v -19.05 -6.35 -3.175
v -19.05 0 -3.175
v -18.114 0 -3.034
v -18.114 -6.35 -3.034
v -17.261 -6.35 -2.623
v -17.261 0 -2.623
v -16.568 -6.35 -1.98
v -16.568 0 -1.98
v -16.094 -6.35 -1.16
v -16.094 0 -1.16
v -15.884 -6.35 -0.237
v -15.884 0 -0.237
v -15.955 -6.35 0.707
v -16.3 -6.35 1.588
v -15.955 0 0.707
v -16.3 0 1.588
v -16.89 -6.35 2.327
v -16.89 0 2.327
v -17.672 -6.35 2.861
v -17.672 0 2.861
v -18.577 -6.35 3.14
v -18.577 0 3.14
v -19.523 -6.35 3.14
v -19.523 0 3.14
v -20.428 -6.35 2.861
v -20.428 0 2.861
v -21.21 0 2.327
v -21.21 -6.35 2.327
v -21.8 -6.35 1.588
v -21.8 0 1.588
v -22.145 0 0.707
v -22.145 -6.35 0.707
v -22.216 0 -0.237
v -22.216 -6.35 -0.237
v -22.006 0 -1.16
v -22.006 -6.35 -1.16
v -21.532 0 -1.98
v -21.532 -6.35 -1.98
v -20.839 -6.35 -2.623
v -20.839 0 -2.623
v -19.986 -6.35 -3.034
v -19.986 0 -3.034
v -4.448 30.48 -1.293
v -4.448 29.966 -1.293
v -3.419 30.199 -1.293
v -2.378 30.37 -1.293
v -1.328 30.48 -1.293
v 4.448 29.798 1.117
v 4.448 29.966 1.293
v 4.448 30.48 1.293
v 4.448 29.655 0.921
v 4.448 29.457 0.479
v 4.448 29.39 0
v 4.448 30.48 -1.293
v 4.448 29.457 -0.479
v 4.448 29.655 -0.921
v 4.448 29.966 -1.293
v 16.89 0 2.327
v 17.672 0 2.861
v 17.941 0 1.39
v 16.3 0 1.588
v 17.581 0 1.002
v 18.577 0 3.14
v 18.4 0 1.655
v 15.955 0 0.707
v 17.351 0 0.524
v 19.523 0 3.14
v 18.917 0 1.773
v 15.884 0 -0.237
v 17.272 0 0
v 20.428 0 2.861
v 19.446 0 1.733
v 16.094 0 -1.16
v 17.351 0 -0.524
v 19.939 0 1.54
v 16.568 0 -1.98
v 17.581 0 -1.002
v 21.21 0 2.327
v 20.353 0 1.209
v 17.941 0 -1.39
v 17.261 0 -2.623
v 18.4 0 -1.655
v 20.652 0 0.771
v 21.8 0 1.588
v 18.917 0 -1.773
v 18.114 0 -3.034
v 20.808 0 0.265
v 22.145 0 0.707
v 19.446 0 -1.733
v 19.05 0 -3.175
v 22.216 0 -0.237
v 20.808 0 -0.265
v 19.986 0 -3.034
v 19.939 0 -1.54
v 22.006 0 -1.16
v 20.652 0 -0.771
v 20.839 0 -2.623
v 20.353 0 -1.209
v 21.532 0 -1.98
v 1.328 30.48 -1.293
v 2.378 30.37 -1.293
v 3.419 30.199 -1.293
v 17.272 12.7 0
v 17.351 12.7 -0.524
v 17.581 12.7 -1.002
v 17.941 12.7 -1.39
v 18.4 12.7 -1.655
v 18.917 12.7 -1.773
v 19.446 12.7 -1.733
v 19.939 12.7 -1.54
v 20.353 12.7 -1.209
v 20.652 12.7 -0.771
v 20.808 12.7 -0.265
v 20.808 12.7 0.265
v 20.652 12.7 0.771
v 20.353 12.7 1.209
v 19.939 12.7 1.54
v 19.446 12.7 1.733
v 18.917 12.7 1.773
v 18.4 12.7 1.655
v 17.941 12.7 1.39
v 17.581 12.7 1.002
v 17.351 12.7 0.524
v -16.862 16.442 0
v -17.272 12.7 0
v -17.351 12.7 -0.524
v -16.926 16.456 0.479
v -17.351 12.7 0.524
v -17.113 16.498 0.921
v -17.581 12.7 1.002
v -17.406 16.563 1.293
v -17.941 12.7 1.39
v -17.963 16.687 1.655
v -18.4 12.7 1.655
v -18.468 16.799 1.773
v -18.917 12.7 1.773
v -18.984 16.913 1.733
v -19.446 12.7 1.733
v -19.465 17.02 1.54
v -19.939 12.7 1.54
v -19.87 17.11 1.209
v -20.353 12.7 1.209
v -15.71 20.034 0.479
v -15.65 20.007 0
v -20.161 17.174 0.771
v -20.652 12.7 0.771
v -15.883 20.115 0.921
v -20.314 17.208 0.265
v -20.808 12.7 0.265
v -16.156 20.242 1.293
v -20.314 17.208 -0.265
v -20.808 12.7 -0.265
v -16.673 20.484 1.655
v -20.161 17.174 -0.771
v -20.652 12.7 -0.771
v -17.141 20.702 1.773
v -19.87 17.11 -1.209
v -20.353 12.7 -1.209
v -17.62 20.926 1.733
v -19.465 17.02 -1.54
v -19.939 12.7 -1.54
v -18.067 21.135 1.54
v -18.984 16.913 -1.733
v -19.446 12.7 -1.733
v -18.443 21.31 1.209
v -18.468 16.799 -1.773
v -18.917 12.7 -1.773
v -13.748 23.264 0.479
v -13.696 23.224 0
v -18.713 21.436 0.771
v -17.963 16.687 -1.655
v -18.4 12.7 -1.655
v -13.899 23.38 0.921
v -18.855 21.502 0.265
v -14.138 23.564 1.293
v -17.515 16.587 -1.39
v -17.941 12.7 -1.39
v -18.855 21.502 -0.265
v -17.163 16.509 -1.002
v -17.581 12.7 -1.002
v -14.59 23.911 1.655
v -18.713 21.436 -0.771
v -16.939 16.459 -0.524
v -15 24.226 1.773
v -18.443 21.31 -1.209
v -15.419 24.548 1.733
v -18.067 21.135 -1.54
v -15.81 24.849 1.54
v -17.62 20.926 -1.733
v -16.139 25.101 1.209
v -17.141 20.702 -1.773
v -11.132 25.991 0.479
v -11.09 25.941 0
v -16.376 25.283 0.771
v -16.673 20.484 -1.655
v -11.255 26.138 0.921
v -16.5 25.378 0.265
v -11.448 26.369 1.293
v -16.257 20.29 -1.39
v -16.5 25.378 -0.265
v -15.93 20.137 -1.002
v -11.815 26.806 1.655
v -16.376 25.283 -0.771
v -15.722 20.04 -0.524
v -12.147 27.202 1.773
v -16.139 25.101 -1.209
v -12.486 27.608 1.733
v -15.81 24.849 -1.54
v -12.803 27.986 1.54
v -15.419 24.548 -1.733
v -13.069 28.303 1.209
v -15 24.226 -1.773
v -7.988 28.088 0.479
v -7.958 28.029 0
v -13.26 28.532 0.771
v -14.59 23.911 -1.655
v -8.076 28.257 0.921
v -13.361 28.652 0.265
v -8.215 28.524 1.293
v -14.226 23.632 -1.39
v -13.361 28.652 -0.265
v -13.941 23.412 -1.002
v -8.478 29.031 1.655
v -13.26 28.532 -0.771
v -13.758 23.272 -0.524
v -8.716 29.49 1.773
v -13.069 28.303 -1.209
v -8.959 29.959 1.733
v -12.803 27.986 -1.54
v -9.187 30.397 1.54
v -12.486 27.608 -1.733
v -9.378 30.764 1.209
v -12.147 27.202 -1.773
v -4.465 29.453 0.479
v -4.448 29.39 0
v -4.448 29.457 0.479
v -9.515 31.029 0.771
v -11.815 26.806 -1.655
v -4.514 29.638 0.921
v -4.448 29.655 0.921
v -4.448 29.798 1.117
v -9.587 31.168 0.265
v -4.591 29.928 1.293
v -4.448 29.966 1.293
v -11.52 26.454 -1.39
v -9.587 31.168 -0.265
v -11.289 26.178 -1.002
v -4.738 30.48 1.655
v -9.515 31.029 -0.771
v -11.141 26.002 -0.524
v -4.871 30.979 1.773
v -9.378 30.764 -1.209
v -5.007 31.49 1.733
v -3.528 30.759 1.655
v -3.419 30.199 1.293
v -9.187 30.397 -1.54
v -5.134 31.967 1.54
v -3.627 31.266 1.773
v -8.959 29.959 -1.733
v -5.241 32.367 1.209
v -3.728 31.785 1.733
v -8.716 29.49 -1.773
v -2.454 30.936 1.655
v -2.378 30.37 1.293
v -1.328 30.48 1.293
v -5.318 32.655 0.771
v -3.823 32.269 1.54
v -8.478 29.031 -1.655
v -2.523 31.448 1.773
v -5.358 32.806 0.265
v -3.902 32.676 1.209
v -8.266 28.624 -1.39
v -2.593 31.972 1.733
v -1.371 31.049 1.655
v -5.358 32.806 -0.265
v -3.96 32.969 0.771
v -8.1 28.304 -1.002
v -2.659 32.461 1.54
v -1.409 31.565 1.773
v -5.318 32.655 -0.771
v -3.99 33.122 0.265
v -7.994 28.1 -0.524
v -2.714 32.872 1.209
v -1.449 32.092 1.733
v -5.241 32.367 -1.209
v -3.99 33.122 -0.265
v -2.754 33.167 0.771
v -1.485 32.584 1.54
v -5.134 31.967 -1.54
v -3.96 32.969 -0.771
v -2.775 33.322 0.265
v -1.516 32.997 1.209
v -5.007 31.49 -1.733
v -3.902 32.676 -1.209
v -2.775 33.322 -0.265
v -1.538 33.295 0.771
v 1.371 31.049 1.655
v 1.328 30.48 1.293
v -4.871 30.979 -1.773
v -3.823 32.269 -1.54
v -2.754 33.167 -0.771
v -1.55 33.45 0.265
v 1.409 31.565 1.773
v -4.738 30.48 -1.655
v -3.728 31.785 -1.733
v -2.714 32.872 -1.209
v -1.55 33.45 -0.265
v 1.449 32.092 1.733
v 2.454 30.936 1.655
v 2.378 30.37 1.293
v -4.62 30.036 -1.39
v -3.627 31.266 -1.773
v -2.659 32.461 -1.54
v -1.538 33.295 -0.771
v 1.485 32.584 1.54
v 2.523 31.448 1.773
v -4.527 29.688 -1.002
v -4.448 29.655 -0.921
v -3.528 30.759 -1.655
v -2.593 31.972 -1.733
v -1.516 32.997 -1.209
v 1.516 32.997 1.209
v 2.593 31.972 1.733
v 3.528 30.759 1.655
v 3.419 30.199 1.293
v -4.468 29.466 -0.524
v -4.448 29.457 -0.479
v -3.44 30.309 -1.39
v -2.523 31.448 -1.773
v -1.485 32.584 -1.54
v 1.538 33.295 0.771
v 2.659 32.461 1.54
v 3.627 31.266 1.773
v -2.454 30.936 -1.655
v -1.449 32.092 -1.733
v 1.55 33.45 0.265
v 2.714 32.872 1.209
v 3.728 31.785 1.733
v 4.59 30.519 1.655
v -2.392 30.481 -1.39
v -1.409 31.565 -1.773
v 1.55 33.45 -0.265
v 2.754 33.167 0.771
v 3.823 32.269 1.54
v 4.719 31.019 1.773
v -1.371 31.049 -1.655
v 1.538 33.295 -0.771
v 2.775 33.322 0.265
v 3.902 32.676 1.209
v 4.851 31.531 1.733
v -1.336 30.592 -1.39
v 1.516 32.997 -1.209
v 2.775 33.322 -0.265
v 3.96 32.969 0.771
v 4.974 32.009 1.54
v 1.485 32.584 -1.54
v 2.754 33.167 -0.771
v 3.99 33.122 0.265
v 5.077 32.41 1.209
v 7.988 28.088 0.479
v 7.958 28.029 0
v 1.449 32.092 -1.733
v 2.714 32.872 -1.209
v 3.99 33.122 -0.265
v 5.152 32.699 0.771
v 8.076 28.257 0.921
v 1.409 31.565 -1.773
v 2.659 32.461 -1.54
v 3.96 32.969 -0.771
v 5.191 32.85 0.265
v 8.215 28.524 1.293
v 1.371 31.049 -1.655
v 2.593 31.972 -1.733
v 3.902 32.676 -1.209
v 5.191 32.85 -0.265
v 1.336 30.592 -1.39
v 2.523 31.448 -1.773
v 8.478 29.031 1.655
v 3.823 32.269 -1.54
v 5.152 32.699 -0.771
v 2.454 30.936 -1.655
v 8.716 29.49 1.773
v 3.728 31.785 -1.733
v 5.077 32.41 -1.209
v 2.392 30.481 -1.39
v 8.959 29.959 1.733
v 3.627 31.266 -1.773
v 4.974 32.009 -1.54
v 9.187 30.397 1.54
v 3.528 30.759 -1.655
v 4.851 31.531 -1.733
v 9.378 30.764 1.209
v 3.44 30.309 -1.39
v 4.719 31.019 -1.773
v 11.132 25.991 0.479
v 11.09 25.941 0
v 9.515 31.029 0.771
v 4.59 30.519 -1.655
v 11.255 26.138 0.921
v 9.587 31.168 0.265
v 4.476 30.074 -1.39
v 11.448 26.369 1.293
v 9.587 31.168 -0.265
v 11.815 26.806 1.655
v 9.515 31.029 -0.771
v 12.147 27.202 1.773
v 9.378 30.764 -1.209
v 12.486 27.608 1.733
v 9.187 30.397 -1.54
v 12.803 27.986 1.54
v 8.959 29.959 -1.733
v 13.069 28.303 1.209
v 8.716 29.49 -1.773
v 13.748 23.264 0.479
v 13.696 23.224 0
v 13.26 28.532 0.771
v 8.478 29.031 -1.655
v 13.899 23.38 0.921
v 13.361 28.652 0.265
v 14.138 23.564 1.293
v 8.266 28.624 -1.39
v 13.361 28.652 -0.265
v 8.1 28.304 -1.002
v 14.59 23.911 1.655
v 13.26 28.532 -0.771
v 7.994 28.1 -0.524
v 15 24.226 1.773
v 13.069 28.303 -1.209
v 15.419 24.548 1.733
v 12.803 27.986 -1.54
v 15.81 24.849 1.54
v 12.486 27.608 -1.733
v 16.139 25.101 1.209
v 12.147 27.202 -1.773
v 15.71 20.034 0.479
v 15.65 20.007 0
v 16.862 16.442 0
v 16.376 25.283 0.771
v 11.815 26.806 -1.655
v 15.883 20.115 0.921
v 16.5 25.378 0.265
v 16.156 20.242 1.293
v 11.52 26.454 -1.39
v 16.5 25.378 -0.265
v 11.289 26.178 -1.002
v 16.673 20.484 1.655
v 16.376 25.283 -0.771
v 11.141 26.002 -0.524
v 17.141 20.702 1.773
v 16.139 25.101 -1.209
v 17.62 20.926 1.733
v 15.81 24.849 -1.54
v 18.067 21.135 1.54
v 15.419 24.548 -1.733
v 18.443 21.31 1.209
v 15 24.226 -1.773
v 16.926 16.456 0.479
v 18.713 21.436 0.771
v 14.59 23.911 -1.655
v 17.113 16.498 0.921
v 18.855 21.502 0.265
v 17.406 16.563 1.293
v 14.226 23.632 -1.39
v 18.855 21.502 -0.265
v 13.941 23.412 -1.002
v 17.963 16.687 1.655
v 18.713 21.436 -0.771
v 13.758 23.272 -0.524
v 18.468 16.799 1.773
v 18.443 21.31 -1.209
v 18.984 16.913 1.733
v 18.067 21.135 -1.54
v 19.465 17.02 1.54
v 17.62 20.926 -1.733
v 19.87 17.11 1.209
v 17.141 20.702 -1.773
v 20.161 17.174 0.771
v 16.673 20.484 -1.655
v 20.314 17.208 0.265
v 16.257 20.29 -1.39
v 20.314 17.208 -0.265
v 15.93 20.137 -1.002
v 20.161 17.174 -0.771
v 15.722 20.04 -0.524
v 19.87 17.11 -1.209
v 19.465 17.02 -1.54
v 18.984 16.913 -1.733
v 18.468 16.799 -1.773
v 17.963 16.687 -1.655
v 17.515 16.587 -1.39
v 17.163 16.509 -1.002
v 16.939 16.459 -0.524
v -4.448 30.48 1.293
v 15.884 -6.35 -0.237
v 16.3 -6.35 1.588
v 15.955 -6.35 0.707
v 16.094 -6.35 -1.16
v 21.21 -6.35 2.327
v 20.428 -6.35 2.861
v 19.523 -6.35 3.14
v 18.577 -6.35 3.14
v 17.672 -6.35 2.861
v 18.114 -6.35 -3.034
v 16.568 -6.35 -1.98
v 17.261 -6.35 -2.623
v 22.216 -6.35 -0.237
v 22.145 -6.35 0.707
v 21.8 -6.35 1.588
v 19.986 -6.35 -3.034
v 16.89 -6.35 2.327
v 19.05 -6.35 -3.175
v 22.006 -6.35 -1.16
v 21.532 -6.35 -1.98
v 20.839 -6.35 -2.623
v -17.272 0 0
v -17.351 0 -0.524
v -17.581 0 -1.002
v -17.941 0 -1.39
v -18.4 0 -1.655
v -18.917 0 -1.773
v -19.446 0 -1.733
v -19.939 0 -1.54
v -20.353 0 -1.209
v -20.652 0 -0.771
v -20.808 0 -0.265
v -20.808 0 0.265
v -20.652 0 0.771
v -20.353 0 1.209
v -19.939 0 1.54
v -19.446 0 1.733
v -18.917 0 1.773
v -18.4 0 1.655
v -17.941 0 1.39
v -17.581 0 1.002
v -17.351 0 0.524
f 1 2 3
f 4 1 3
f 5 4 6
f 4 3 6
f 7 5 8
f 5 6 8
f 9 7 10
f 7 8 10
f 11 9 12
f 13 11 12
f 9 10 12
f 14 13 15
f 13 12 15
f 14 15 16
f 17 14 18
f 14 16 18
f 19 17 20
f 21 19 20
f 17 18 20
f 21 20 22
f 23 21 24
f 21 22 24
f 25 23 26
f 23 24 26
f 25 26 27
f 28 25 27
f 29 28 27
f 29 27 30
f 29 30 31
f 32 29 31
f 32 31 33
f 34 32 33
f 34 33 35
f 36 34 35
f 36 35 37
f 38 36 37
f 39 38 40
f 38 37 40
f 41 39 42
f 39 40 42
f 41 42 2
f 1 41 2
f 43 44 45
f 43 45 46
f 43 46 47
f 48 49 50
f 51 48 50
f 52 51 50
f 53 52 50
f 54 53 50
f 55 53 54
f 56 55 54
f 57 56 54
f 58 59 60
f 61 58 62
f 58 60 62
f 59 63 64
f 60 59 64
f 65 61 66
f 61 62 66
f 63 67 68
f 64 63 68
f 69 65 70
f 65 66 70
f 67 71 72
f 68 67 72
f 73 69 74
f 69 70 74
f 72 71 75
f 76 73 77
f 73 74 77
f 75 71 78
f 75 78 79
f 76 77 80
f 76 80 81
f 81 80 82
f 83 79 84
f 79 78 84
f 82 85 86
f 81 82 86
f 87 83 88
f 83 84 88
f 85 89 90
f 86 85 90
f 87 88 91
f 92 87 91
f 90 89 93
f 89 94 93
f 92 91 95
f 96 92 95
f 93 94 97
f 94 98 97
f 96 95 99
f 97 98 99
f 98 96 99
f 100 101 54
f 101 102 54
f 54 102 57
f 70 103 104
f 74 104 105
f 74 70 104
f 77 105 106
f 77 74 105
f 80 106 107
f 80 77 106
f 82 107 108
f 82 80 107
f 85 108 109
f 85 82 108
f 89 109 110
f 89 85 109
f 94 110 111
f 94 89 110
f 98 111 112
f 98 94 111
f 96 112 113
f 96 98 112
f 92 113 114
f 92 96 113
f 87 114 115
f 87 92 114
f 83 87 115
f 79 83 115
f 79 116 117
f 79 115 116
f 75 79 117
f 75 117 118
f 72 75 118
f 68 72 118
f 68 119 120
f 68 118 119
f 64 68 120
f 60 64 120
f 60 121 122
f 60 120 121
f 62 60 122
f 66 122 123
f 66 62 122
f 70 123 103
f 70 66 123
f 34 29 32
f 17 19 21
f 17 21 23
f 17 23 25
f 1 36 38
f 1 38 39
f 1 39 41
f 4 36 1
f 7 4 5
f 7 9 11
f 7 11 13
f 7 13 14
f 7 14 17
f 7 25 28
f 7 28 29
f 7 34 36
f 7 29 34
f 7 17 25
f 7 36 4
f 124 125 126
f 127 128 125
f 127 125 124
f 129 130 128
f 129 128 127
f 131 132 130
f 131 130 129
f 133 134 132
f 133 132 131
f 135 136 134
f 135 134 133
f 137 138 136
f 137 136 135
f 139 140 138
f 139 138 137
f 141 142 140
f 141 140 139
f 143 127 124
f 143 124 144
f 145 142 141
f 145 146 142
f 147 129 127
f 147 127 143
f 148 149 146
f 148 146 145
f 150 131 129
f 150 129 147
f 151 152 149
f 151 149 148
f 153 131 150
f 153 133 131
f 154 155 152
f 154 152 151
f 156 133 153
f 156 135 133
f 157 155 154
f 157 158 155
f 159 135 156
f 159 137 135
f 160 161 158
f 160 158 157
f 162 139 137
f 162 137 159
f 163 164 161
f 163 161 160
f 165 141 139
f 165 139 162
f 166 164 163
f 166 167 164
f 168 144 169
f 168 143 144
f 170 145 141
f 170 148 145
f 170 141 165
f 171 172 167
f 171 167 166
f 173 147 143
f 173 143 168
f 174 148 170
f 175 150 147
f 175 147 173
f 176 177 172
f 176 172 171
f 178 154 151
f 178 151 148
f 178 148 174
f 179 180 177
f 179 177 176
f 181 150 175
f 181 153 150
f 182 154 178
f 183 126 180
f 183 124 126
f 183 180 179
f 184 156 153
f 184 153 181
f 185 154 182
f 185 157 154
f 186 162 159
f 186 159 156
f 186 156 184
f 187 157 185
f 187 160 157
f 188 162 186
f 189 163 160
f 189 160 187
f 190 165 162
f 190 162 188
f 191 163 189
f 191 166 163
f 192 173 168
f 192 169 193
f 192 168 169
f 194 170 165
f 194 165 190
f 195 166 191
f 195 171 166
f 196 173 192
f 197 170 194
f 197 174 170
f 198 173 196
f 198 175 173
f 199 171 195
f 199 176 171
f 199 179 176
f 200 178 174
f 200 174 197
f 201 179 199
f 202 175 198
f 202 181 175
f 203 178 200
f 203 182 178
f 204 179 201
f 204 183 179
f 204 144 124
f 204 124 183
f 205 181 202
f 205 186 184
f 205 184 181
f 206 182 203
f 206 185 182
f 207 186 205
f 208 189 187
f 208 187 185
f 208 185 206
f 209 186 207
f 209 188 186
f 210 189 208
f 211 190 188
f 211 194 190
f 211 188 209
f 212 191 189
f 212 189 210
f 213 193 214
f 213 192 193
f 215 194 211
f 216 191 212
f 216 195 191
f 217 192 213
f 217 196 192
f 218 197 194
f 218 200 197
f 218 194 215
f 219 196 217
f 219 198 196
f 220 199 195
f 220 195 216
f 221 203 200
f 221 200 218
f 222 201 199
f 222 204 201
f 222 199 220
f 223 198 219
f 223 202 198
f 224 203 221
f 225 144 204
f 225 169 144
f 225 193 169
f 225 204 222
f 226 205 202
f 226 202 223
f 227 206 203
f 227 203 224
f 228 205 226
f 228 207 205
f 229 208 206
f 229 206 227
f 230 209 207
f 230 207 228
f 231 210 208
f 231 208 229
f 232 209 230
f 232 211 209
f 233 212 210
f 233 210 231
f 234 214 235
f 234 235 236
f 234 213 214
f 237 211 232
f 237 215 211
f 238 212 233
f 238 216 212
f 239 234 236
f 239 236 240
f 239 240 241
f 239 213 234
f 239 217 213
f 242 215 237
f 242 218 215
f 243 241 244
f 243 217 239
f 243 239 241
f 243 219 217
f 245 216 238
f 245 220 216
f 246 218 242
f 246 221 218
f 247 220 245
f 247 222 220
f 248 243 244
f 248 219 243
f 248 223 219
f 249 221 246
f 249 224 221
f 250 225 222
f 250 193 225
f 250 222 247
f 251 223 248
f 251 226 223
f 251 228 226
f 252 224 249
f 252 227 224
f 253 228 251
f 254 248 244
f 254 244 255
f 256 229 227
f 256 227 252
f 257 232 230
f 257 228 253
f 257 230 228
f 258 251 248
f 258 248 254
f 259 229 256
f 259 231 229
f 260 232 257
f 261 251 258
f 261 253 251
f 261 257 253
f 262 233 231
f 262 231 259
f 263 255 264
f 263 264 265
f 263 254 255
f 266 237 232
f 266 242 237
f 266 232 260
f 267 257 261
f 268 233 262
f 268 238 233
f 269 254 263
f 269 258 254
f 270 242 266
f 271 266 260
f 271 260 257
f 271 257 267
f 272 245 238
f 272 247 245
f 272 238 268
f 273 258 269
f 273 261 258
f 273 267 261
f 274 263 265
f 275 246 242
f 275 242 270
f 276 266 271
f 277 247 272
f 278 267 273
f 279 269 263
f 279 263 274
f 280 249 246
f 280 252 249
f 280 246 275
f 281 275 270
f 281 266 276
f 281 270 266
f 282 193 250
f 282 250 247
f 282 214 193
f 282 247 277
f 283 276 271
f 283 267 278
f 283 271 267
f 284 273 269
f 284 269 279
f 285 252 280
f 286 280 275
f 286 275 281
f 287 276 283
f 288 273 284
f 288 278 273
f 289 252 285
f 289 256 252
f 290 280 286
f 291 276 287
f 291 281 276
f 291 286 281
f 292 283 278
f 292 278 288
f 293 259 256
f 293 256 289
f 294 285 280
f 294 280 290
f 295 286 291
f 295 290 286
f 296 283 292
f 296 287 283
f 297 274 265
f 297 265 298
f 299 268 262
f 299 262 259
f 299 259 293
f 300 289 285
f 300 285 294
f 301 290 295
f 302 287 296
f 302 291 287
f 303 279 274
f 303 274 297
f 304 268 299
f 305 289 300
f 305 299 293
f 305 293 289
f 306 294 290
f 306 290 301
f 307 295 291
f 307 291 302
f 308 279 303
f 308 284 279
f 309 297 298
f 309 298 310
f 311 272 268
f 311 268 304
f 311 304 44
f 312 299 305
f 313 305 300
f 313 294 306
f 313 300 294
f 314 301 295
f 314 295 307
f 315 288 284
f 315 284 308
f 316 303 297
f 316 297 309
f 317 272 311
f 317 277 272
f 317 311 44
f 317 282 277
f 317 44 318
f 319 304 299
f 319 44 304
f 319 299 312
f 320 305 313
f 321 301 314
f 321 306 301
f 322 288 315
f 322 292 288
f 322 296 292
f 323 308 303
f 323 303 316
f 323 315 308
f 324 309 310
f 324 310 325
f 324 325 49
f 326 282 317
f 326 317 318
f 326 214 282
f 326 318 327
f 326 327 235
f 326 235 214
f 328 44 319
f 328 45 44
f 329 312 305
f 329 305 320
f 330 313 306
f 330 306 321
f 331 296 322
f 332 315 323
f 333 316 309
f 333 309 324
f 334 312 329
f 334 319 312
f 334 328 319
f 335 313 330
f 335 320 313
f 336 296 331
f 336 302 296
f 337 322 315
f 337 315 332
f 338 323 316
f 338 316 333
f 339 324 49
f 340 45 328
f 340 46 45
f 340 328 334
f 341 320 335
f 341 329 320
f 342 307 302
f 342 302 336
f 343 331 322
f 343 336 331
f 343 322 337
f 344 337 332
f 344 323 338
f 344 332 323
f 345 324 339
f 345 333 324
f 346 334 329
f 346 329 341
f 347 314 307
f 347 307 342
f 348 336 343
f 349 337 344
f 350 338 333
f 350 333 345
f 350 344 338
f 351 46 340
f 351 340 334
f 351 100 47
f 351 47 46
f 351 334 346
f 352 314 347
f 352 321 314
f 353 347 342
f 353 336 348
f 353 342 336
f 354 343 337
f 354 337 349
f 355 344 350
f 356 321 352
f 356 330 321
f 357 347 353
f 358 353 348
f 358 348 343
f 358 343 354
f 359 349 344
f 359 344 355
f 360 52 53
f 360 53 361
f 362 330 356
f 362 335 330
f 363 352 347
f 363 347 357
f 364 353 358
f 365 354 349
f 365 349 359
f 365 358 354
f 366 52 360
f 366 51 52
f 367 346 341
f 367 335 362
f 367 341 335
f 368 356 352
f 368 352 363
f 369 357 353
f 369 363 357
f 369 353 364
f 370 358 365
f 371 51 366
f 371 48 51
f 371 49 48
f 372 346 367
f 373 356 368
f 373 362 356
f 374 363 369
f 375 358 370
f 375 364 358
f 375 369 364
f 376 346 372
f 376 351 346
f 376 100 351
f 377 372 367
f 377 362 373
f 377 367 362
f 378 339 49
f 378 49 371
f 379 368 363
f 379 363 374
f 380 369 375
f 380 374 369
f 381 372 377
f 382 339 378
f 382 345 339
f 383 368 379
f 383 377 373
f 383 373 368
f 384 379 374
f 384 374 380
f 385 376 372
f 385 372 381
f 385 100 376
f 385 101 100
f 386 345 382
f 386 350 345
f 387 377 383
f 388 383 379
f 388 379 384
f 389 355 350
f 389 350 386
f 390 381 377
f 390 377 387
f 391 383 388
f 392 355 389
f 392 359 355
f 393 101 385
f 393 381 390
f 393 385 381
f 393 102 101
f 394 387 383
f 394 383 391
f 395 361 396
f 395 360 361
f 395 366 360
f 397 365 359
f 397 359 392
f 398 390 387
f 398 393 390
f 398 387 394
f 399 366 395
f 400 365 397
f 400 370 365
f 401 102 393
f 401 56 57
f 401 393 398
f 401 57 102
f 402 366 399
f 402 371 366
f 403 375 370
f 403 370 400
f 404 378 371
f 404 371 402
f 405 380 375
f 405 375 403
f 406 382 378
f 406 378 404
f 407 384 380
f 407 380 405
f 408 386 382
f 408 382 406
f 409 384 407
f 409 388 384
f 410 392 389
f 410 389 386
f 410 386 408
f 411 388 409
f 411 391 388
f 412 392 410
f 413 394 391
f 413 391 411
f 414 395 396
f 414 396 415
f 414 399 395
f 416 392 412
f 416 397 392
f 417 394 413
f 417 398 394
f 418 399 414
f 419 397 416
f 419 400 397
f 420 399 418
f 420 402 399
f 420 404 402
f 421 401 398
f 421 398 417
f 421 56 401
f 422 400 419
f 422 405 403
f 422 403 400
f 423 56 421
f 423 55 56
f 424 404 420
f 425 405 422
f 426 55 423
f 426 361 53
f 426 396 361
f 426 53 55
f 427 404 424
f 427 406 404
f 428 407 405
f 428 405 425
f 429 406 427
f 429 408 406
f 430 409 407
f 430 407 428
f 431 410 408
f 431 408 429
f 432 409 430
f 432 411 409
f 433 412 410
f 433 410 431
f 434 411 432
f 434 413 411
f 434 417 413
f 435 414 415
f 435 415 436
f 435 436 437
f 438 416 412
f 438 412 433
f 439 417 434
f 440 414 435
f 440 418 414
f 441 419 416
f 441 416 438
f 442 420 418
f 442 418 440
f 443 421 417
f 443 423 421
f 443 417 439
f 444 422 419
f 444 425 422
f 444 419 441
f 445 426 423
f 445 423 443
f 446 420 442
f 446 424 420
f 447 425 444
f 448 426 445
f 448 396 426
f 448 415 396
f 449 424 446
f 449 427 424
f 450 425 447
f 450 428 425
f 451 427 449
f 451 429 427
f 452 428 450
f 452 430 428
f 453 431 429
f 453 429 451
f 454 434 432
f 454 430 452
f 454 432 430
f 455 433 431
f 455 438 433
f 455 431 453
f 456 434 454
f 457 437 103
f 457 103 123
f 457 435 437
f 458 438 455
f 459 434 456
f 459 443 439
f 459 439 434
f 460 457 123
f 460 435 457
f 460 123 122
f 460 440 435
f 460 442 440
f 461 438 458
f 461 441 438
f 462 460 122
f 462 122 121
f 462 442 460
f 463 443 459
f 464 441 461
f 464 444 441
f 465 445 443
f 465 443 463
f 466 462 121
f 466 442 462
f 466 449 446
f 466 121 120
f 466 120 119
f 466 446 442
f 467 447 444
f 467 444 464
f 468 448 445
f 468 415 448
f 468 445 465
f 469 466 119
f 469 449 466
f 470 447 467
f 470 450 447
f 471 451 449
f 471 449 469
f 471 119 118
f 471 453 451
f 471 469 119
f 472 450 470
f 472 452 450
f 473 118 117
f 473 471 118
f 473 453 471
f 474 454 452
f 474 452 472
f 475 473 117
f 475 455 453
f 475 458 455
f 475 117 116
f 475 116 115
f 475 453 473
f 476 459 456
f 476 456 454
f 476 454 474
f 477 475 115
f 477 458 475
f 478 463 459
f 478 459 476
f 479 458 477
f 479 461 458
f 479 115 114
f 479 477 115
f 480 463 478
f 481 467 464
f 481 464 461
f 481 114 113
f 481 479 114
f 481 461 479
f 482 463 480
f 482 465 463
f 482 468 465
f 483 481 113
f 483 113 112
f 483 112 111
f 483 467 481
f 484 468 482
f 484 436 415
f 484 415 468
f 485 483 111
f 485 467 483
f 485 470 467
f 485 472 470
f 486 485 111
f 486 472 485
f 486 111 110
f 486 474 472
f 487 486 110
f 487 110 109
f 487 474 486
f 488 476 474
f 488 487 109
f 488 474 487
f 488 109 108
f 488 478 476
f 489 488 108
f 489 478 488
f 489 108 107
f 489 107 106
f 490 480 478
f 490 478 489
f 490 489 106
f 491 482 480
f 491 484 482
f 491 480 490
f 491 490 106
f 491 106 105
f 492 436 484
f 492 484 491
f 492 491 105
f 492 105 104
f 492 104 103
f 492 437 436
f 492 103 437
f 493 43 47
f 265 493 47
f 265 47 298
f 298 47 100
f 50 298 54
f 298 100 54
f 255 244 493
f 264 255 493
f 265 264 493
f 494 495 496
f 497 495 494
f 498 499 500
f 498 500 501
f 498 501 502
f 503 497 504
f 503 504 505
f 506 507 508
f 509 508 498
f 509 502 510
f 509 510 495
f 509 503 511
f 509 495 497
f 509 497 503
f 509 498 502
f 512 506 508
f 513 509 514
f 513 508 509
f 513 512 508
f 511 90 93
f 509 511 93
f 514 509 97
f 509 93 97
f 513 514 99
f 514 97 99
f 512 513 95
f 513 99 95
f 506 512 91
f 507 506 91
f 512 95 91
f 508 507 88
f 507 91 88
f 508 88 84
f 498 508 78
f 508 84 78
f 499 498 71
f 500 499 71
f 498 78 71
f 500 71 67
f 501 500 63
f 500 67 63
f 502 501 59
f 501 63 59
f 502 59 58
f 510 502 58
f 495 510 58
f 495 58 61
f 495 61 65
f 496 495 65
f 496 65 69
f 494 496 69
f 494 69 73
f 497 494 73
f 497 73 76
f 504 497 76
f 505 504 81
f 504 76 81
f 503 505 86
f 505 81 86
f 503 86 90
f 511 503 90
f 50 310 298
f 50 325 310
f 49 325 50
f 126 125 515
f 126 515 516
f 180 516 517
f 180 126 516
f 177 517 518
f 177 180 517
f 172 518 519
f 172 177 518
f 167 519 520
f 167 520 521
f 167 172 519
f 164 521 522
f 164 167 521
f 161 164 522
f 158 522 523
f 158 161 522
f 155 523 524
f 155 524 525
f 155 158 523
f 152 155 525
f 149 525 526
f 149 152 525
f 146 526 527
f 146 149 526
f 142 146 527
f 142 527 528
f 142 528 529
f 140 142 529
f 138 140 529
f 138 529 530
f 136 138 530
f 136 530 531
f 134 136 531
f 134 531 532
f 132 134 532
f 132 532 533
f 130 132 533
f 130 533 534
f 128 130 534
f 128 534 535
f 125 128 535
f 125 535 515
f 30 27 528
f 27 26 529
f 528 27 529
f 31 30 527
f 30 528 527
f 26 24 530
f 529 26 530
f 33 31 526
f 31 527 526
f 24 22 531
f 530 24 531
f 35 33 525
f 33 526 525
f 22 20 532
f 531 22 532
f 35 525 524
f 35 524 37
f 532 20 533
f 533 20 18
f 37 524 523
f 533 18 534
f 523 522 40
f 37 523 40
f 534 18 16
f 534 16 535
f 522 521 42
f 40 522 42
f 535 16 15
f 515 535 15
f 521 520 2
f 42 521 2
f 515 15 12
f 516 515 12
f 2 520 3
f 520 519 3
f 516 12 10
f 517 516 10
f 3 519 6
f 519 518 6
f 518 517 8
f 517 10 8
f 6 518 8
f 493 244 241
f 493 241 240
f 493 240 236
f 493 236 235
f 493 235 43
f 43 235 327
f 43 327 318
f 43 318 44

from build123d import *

# Parameters (mm, degrees)
SKETCH3_R           = 1.778
SKETCH4_R           = 3.175
BOSS_EXTRUDE1_DEPTH = 6.35
SKETCH5_R           = 3.175
BOSS_EXTRUDE2_DEPTH = 6.35
SKETCH6_W           = 8.89531995
SKETCH6_H           = 2.585925644
CUT_EXTRUDE1_DEPTH  = 2.54


with BuildPart() as part:
    # Sweep1: sweep along a path in Sketch2
    with BuildLine(Plane.XY) as sweep1_path:
        Line((-19.05, 0), (-19.05, 12.7))
        ThreePointArc((-19.05, 12.7), (0, 31.75), (19.05, 12.7))
        Line((19.05, 12.7), (19.05, 0))
    # Sketch3 → Sweep1 (sweep)
    with BuildSketch(Plane(origin=(0, 0, 0), x_dir=(1, 0, 0), z_dir=(0, 1, 0))):
        with Locations((-19.05, 0)):
            Circle(SKETCH3_R)
    sweep(path=sweep1_path.line)

    # Sketch4 → Boss-Extrude1 (add)
    with BuildSketch(Plane.XZ):
        with Locations(Location((-19.05, 0, 0), (0, 0, 270))):
            Circle(SKETCH4_R)
    extrude(amount=BOSS_EXTRUDE1_DEPTH)

    # Sketch5 → Boss-Extrude2 (add)
    with BuildSketch(Plane.XZ):
        with Locations(Location((19.05, 0, 0), (0, 0, 270))):
            Circle(SKETCH5_R)
    extrude(amount=BOSS_EXTRUDE2_DEPTH)

    # Sketch6 → Cut-Extrude1 (cut)
    with BuildSketch(Plane(origin=(0, 27.94, 0), x_dir=(1, 0, 0), z_dir=(0, 1, 0))):
        Rectangle(SKETCH6_W, SKETCH6_H)
    extrude(amount=CUT_EXTRUDE1_DEPTH, mode=Mode.SUBTRACT)


solid = part.part
